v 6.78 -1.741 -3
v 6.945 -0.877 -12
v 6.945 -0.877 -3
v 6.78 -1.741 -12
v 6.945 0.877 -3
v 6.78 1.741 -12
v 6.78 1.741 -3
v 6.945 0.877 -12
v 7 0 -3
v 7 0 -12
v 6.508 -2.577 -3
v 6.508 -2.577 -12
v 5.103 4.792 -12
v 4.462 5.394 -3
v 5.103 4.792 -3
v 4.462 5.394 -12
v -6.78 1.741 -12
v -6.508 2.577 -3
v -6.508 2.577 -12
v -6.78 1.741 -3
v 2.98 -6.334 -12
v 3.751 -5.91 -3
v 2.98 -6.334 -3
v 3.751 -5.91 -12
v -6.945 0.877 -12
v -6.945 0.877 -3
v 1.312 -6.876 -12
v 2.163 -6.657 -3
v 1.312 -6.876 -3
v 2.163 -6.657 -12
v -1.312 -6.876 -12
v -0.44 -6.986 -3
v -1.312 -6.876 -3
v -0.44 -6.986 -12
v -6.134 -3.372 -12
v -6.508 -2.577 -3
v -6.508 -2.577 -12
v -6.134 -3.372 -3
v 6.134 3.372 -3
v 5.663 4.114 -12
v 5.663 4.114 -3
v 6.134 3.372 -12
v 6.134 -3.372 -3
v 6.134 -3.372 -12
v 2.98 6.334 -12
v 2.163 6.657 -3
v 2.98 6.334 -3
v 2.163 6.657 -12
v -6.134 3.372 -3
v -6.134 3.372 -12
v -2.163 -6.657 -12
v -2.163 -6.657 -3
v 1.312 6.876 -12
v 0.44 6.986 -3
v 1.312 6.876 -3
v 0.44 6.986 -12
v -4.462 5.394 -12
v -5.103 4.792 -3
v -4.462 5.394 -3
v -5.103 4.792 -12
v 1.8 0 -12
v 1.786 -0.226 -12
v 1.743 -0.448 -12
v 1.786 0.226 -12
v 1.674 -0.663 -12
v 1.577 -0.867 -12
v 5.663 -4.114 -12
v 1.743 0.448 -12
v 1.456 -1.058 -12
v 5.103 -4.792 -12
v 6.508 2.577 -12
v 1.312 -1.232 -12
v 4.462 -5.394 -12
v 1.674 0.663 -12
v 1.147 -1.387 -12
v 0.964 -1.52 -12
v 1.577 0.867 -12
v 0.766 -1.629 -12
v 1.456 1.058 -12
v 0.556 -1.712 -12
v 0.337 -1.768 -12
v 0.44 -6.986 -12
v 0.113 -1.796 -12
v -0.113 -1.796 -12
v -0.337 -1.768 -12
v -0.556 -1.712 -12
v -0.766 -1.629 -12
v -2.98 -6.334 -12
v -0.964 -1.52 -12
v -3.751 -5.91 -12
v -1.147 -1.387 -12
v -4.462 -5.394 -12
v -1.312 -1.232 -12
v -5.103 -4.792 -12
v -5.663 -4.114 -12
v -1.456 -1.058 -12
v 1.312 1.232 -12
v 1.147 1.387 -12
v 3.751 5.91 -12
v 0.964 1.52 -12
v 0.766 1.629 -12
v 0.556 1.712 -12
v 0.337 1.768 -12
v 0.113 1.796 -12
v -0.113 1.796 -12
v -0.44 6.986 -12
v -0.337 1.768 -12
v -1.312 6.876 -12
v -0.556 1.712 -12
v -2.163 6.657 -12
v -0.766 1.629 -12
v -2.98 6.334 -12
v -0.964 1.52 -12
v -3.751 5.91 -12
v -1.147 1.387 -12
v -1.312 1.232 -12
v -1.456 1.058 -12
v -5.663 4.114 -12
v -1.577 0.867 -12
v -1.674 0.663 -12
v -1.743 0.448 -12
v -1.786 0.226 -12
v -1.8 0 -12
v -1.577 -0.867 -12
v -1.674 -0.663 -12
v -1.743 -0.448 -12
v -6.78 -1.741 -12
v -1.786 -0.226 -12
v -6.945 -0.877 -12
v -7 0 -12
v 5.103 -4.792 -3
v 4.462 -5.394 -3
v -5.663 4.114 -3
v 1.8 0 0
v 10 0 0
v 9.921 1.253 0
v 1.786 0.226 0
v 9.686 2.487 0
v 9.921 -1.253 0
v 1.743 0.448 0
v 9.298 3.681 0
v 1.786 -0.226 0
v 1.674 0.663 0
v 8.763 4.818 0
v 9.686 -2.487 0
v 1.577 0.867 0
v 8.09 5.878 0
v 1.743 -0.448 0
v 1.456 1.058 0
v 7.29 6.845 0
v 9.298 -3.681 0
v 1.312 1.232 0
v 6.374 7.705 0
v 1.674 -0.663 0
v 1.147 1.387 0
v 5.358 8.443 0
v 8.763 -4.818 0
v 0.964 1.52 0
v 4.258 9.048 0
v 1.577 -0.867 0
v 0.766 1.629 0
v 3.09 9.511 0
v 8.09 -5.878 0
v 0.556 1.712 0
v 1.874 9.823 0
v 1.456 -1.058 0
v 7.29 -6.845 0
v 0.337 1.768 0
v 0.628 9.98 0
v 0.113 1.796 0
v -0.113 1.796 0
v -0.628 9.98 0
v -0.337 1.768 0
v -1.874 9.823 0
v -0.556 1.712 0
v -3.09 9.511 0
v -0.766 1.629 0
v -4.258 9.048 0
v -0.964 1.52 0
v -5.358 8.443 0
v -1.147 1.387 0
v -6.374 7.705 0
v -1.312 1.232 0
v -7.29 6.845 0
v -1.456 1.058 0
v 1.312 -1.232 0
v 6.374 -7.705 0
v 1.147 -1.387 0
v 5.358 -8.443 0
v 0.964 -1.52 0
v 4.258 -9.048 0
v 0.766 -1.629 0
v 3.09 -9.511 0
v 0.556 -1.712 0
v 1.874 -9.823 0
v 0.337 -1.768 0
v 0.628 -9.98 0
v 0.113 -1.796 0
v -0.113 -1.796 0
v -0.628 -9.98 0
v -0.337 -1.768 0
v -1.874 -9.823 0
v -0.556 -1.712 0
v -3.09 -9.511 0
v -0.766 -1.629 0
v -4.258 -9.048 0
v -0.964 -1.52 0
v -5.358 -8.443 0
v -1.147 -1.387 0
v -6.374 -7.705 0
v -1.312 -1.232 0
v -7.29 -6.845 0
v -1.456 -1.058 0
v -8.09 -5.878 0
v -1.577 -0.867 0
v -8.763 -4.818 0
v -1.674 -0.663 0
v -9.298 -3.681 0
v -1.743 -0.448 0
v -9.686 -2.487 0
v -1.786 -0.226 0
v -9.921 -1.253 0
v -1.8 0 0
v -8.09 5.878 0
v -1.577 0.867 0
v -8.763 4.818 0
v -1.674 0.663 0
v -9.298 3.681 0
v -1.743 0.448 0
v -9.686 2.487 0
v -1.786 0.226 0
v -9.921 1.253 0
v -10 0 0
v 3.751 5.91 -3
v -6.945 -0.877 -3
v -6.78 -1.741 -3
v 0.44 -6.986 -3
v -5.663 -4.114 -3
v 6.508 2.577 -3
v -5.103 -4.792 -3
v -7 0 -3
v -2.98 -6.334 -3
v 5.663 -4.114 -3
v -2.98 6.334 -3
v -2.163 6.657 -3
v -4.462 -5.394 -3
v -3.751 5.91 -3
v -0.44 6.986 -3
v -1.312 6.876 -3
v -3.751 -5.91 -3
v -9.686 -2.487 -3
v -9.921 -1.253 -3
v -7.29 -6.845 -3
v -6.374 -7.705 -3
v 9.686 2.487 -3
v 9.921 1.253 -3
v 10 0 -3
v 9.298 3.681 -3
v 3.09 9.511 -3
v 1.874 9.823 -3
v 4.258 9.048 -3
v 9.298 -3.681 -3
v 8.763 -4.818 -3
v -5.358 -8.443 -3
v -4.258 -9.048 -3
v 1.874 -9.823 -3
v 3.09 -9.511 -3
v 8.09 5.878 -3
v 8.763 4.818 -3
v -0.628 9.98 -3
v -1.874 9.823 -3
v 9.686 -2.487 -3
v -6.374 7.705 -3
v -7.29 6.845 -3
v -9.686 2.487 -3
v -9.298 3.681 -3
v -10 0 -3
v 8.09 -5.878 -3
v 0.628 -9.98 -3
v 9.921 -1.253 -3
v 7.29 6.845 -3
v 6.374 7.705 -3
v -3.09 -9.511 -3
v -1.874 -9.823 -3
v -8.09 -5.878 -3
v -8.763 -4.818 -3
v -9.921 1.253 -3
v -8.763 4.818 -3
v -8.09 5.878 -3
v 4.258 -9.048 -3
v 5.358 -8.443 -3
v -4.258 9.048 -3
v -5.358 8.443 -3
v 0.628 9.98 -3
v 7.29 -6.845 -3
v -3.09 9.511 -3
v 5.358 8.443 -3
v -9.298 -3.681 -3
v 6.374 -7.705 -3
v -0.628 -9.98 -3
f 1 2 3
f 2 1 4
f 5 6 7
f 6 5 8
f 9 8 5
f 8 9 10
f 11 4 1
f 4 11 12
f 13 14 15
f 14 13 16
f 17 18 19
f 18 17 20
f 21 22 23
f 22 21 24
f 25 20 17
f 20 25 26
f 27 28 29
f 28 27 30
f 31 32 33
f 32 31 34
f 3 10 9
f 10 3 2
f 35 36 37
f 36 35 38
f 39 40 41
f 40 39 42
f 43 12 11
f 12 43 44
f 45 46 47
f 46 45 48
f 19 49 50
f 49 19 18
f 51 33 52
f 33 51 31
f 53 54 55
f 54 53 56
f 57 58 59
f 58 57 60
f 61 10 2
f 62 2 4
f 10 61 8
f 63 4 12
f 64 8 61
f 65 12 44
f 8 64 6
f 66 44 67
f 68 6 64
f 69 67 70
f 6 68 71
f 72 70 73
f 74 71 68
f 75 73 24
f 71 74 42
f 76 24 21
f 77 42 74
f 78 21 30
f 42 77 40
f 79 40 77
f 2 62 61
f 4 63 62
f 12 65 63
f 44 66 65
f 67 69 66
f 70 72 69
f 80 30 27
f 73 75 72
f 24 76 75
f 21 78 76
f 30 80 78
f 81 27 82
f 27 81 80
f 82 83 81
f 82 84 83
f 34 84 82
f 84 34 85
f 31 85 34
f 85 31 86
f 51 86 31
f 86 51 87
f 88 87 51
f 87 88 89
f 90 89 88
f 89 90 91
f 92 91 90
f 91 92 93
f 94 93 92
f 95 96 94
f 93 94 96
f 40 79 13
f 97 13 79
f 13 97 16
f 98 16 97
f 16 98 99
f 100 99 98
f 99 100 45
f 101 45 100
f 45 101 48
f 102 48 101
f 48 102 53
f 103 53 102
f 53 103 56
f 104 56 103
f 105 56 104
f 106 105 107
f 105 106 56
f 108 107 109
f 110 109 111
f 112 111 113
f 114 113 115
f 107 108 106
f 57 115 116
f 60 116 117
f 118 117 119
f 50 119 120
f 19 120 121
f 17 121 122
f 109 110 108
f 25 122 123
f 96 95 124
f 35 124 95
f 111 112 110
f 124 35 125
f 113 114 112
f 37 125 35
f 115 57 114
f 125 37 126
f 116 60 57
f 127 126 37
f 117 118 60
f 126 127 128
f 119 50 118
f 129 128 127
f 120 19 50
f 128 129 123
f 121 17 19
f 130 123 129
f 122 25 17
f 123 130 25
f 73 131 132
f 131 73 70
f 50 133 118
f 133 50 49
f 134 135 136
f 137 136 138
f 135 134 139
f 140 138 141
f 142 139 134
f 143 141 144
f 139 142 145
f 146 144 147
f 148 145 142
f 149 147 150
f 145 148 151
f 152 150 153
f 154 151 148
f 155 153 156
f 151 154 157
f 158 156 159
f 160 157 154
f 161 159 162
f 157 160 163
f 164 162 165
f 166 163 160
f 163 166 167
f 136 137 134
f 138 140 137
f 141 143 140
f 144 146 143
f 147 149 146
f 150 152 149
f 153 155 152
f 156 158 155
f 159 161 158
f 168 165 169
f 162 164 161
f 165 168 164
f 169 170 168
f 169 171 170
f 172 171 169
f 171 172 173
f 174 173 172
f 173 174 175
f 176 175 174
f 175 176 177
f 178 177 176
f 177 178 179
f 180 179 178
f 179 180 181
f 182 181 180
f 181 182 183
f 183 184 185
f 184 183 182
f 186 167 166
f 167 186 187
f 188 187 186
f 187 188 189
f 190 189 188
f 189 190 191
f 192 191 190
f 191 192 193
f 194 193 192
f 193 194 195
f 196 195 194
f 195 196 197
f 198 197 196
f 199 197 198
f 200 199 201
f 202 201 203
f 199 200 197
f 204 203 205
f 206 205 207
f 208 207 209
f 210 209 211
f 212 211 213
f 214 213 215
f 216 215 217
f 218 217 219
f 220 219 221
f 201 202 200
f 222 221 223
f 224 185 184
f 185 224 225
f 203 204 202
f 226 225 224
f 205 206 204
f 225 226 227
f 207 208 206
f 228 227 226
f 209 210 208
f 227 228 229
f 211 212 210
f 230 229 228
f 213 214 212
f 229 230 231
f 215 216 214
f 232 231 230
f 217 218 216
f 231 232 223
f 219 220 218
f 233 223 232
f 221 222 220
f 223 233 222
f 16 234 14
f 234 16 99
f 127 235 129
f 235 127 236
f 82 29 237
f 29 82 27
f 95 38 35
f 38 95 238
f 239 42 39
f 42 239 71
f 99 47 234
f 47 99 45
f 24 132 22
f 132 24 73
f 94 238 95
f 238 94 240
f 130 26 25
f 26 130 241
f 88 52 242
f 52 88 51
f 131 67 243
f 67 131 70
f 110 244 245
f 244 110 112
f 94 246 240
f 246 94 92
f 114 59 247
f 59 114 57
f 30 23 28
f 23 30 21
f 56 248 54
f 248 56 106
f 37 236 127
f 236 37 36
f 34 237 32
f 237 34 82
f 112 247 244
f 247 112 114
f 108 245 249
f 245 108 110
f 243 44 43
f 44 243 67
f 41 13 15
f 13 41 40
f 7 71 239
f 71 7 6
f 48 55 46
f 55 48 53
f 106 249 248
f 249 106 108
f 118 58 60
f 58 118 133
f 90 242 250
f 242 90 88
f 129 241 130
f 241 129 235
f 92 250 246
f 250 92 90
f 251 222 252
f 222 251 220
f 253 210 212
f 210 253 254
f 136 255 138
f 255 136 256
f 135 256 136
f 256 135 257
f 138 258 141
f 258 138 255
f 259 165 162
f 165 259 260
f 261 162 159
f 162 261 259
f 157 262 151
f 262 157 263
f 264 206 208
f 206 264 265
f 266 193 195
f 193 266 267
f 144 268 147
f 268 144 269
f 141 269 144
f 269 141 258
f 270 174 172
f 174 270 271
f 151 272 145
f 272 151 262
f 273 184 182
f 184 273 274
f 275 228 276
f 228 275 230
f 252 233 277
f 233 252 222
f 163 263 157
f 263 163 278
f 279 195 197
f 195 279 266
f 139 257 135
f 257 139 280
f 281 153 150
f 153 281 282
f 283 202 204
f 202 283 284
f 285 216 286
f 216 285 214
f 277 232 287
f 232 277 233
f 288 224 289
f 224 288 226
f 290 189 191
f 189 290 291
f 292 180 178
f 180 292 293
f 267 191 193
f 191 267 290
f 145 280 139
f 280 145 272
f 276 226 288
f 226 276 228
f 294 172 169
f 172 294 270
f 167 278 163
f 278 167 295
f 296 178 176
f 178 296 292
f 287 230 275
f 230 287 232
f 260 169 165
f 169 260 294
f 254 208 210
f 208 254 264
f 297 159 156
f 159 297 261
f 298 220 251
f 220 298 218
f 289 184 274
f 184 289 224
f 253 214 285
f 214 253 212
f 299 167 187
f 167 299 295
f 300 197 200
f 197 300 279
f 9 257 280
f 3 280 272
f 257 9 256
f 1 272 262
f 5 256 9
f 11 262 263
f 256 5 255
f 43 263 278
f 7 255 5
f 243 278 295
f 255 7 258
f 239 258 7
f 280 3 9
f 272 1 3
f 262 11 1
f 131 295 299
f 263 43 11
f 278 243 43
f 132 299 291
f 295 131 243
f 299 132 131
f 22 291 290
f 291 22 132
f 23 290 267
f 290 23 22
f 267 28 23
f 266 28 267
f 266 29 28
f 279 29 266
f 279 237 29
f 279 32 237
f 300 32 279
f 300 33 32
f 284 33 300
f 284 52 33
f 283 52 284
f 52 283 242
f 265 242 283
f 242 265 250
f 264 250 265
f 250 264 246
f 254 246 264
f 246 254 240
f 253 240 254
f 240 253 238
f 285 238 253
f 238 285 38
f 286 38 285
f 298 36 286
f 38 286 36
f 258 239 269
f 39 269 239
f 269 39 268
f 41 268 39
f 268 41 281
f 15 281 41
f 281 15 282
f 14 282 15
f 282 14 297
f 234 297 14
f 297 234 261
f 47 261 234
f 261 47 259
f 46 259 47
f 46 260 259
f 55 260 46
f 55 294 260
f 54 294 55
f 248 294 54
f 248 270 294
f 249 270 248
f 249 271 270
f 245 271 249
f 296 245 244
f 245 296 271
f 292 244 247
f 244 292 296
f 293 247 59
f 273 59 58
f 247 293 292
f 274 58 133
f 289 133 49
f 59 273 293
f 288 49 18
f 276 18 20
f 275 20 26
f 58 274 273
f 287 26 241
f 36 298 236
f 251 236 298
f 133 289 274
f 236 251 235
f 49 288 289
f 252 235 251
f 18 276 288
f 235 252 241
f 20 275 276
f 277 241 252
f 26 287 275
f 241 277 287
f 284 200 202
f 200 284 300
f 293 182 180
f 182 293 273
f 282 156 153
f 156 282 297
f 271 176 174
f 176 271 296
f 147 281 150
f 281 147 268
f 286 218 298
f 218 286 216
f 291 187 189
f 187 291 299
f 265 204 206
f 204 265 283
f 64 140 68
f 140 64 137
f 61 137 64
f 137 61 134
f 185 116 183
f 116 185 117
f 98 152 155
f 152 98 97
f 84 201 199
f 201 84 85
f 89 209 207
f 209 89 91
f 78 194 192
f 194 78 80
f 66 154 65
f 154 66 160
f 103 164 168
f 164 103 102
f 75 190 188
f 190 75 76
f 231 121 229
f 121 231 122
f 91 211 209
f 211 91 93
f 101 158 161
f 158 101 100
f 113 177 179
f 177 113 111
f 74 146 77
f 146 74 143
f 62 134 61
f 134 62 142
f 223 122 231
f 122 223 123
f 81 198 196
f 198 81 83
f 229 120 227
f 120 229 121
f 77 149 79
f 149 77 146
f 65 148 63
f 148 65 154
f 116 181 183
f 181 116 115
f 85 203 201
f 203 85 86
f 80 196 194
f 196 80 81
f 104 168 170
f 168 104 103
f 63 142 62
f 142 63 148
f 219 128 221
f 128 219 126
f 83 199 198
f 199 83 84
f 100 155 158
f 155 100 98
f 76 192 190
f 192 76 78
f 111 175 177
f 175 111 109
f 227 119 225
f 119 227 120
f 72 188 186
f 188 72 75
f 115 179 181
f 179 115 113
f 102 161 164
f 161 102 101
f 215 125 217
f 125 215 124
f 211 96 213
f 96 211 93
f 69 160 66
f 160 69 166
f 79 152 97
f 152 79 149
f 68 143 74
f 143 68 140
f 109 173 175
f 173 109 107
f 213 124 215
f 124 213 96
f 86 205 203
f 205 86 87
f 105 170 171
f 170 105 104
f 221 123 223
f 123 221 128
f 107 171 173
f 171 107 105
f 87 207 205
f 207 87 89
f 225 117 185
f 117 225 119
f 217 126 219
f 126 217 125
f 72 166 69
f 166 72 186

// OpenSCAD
$fn = 50;


difference() {
	union() {
		translate(v = [0, 0, -12.0000000000]) {
			cylinder(h = 12, r = 7.0000000000);
		}
		translate(v = [0, 0, -3.0000000000]) {
			cylinder(h = 3, r = 10.0000000000);
		}
	}
	union() {
		#translate(v = [0, 0, -12]) {
			cylinder(h = 12, r = 1.8000000000);
		}
	}
}
